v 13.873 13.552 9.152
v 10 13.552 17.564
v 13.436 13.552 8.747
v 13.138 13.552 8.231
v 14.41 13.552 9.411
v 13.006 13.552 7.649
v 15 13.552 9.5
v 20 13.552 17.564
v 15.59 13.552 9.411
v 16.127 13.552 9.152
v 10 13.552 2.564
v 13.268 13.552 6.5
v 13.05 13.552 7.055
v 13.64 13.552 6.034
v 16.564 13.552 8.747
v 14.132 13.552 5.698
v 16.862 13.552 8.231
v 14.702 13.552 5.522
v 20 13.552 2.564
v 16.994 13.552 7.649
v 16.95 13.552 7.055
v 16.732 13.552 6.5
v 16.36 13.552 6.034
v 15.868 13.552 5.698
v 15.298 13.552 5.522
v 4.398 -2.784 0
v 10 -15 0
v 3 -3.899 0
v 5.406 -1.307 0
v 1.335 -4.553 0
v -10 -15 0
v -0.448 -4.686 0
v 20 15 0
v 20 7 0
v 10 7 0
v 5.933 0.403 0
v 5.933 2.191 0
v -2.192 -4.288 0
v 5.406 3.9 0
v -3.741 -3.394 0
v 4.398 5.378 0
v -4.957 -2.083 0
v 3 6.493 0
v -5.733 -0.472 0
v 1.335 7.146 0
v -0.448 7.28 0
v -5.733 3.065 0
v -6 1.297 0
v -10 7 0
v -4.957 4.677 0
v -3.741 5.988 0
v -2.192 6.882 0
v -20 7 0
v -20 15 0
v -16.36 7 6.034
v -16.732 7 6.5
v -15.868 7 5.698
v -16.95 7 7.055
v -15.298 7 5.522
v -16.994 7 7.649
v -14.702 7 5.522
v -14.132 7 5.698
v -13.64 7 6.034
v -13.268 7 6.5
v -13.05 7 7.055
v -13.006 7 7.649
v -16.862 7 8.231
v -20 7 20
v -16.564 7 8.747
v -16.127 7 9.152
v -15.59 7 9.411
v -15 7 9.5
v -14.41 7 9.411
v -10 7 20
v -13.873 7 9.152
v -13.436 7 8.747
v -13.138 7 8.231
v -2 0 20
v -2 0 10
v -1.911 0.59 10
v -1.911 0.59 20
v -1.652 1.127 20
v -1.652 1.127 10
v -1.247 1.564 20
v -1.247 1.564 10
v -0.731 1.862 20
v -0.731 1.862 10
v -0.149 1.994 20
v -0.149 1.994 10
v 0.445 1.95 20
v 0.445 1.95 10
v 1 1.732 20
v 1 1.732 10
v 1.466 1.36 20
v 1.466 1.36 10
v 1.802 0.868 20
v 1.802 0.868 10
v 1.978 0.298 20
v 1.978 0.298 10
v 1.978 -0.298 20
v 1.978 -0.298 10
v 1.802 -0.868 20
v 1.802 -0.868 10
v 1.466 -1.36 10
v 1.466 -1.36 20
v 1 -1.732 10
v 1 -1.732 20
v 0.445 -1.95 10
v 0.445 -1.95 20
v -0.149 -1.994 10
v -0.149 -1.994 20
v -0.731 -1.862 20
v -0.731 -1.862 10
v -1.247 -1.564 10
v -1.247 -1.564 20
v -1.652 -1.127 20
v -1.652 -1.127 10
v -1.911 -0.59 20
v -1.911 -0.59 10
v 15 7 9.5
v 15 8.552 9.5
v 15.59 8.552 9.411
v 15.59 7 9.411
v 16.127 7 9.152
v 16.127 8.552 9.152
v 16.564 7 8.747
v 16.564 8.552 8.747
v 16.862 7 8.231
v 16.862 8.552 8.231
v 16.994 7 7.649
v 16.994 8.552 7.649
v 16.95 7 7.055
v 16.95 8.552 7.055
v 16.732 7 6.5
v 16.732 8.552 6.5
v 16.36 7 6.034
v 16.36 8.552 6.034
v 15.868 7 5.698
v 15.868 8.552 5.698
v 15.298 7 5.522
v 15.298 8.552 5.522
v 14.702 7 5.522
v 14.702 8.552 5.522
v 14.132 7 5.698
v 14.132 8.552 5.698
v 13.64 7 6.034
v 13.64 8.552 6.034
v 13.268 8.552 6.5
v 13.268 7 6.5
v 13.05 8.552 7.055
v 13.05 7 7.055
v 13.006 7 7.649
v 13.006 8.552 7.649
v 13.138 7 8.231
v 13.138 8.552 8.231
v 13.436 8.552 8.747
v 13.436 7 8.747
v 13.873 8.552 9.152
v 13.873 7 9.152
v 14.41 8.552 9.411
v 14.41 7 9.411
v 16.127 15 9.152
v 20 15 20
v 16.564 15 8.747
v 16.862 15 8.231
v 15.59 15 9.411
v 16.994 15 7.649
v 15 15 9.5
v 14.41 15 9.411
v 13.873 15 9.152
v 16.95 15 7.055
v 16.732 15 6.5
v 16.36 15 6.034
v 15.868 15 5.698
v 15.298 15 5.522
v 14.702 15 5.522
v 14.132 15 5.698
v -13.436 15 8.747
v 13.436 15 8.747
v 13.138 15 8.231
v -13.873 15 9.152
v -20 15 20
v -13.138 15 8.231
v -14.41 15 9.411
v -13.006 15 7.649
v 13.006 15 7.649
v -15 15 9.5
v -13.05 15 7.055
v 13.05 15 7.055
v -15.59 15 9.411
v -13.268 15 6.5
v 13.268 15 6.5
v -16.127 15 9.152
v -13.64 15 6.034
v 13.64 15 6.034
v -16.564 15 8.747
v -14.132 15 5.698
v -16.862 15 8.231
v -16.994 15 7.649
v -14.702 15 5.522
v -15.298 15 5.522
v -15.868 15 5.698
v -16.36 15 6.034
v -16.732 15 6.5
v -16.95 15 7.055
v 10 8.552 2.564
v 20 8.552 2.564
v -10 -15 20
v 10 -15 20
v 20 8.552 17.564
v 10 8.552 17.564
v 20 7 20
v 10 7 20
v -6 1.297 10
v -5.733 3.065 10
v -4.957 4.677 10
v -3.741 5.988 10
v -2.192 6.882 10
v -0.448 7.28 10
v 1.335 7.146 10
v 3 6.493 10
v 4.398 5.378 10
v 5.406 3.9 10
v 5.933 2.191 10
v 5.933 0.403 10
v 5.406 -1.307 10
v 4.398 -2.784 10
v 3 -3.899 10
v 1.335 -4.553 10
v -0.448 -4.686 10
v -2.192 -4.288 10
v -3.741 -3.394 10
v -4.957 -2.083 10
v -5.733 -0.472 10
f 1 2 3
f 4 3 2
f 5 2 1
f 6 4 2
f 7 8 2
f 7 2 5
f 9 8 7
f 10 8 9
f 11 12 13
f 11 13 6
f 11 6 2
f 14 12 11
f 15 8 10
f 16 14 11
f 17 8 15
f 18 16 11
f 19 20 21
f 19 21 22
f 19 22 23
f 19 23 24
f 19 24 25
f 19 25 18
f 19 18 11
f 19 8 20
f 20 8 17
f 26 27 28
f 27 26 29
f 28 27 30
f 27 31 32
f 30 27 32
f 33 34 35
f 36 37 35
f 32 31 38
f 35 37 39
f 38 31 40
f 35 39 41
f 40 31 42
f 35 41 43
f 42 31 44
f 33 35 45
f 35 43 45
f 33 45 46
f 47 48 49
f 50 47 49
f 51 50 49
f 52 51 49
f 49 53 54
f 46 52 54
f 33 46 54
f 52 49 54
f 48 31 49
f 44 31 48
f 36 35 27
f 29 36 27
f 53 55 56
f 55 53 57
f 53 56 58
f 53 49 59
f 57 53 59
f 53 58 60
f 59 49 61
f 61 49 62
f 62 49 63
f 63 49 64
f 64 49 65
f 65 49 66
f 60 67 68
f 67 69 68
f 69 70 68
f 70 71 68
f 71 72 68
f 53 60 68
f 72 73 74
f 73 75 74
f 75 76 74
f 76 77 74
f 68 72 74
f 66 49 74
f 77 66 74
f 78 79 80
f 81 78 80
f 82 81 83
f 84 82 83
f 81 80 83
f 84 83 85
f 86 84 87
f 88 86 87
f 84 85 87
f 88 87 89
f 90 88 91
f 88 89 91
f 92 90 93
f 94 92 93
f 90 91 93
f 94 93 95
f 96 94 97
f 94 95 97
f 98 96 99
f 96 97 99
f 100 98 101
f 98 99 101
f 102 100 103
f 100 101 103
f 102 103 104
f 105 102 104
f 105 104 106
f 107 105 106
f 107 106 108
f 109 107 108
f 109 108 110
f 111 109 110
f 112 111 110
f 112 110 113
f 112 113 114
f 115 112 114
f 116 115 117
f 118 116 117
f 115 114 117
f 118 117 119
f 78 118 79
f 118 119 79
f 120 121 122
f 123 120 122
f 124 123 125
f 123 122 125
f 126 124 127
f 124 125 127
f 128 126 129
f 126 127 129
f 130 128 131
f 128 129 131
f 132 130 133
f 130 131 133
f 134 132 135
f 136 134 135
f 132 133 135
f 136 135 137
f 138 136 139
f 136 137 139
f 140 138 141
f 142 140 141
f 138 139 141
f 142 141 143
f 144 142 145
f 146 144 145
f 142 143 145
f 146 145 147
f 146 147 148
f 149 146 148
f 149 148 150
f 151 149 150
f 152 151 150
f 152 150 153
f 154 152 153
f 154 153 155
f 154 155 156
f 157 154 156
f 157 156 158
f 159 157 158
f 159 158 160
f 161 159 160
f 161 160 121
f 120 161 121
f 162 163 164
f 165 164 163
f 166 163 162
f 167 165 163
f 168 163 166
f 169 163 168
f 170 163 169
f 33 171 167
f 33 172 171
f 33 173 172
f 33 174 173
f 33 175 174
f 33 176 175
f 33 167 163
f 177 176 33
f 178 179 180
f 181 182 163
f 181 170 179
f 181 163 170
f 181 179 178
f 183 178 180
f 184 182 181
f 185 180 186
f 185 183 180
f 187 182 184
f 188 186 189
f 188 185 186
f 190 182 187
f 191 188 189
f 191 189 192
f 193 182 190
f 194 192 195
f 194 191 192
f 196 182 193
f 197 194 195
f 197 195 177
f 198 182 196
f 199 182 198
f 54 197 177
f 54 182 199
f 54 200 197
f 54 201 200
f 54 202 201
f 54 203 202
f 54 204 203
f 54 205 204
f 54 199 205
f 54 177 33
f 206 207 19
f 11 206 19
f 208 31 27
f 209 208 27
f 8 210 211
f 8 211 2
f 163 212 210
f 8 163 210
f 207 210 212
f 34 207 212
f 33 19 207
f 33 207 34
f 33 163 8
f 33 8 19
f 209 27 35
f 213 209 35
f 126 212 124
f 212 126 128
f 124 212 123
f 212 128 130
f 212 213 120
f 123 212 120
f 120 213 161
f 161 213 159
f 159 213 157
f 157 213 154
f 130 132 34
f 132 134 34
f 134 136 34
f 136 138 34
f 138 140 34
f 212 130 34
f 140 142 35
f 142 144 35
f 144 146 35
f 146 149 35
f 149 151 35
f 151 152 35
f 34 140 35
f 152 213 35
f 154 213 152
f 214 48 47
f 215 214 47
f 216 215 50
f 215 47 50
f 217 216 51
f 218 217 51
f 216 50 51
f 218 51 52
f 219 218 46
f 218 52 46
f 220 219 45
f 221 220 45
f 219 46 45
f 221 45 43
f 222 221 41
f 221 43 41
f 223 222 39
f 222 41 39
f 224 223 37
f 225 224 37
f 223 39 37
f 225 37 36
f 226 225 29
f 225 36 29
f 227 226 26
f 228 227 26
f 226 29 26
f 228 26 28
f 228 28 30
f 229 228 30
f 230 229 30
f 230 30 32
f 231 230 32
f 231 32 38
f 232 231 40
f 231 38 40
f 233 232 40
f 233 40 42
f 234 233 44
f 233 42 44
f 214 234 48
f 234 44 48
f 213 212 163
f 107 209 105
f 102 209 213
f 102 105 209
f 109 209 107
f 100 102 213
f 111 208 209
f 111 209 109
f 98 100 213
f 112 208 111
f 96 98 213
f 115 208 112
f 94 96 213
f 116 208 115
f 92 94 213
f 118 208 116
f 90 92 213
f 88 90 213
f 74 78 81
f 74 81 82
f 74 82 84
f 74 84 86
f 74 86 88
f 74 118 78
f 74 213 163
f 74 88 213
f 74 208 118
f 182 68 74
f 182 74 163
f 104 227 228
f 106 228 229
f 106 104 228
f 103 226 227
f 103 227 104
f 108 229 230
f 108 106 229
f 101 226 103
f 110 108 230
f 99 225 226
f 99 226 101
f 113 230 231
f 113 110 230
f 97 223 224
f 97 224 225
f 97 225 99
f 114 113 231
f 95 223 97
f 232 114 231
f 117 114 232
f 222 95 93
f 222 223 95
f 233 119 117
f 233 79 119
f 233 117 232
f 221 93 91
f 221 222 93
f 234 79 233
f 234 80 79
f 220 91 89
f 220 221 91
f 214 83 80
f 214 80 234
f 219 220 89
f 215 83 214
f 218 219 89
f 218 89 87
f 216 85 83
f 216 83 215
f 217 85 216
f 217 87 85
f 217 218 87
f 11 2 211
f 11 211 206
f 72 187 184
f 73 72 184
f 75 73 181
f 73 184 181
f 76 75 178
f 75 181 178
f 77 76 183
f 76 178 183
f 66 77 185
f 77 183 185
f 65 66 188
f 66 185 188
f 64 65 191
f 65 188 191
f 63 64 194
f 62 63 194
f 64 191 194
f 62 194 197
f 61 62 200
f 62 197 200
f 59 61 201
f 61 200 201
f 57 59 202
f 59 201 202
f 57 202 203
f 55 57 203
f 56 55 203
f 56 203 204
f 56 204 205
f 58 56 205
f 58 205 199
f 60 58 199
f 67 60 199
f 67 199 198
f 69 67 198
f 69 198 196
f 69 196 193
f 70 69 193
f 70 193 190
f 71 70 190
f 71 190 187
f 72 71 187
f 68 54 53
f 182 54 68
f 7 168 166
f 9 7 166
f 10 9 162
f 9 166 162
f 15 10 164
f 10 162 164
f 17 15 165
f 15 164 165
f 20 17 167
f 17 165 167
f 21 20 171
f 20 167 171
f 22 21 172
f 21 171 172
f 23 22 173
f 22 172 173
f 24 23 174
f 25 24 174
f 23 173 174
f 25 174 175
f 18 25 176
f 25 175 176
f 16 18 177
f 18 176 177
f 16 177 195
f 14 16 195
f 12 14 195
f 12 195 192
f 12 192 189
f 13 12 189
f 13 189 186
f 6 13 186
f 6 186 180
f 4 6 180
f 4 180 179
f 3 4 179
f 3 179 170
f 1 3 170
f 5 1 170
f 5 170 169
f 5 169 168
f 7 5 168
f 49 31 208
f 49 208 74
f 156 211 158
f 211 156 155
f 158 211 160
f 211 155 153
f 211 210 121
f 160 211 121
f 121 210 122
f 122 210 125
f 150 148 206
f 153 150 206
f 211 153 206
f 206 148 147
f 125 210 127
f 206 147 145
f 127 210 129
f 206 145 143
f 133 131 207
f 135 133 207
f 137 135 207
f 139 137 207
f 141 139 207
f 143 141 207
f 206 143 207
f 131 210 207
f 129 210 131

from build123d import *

# Parameters (mm, degrees)
SKETCH1_W           = 20
SKETCH1_H           = 30
BOSS_EXTRUDE1_DEPTH = 20
SKETCH2_W           = 20
SKETCH2_H           = 8
BOSS_EXTRUDE2_DEPTH = 10
SKETCH3_W           = 20
SKETCH3_H           = 8
BOSS_EXTRUDE3_DEPTH = 10
SKETCH4_R           = 2
CUT_EXTRUDE1_DEPTH  = 10
SKETCH5_R           = 6
CUT_EXTRUDE3_DEPTH  = 10
SKETCH6_R           = 2
CUT_EXTRUDE4_DEPTH  = 10
SKETCH7_W           = 15
SKETCH7_H           = 5
CUT_EXTRUDE5_DEPTH  = 10


with BuildPart() as part:
    # Sketch1 → Boss-Extrude1 (new body)
    with BuildSketch(Plane.XY):
        Rectangle(SKETCH1_W, SKETCH1_H)
    extrude(amount=BOSS_EXTRUDE1_DEPTH)

    # Sketch2 → Boss-Extrude2 (add)
    with BuildSketch(Plane.ZY.offset(10)):
        with Locations((10, 11)):
            Rectangle(SKETCH2_W, SKETCH2_H)
    extrude(amount=BOSS_EXTRUDE2_DEPTH)

    # Sketch3 → Boss-Extrude3 (add)
    with BuildSketch(Plane(origin=(10, 0, 0), x_dir=(0, 0, -1), z_dir=(1, 0, 0))):
        with Locations((-10, 11)):
            Rectangle(SKETCH3_W, SKETCH3_H)
    extrude(amount=BOSS_EXTRUDE3_DEPTH)

    # Sketch4 → Cut-Extrude1 (cut)
    with BuildSketch(Plane(origin=(0, 15, 0), x_dir=(1, 0, 0), z_dir=(0, 1, 0))):
        with Locations(Location((-15, -7.5, 0), (0, 0, 270))):
            Circle(SKETCH4_R)
        with Locations(Location((15, -7.5, 0), (0, 0, 270))):
            Circle(SKETCH4_R)
    extrude(amount=-CUT_EXTRUDE1_DEPTH, mode=Mode.SUBTRACT)

    # Sketch5 → Cut-Extrude3 (cut)
    with BuildSketch(Plane(origin=(0, 0, 0), x_dir=(-1, 0, 0), z_dir=(0, 0, -1))):
        with Locations((0, 1.296765848)):
            Circle(SKETCH5_R)
    extrude(amount=-CUT_EXTRUDE3_DEPTH, mode=Mode.SUBTRACT)

    # Sketch6 → Cut-Extrude4 (cut)
    with BuildSketch(Plane(origin=(0, 0, 10), x_dir=(-1, 0, 0), z_dir=(0, 0, -1))):
        Circle(SKETCH6_R)
    extrude(amount=-CUT_EXTRUDE4_DEPTH, mode=Mode.SUBTRACT)

    # Sketch7 → Cut-Extrude5 (cut)
    with BuildSketch(Plane(origin=(20, 0, 0), x_dir=(0, 0, -1), z_dir=(1, 0, 0))):
        with Locations((-10.063514781, 11.051610094)):
            Rectangle(SKETCH7_W, SKETCH7_H)
    extrude(amount=-CUT_EXTRUDE5_DEPTH, mode=Mode.SUBTRACT)


solid = part.part
